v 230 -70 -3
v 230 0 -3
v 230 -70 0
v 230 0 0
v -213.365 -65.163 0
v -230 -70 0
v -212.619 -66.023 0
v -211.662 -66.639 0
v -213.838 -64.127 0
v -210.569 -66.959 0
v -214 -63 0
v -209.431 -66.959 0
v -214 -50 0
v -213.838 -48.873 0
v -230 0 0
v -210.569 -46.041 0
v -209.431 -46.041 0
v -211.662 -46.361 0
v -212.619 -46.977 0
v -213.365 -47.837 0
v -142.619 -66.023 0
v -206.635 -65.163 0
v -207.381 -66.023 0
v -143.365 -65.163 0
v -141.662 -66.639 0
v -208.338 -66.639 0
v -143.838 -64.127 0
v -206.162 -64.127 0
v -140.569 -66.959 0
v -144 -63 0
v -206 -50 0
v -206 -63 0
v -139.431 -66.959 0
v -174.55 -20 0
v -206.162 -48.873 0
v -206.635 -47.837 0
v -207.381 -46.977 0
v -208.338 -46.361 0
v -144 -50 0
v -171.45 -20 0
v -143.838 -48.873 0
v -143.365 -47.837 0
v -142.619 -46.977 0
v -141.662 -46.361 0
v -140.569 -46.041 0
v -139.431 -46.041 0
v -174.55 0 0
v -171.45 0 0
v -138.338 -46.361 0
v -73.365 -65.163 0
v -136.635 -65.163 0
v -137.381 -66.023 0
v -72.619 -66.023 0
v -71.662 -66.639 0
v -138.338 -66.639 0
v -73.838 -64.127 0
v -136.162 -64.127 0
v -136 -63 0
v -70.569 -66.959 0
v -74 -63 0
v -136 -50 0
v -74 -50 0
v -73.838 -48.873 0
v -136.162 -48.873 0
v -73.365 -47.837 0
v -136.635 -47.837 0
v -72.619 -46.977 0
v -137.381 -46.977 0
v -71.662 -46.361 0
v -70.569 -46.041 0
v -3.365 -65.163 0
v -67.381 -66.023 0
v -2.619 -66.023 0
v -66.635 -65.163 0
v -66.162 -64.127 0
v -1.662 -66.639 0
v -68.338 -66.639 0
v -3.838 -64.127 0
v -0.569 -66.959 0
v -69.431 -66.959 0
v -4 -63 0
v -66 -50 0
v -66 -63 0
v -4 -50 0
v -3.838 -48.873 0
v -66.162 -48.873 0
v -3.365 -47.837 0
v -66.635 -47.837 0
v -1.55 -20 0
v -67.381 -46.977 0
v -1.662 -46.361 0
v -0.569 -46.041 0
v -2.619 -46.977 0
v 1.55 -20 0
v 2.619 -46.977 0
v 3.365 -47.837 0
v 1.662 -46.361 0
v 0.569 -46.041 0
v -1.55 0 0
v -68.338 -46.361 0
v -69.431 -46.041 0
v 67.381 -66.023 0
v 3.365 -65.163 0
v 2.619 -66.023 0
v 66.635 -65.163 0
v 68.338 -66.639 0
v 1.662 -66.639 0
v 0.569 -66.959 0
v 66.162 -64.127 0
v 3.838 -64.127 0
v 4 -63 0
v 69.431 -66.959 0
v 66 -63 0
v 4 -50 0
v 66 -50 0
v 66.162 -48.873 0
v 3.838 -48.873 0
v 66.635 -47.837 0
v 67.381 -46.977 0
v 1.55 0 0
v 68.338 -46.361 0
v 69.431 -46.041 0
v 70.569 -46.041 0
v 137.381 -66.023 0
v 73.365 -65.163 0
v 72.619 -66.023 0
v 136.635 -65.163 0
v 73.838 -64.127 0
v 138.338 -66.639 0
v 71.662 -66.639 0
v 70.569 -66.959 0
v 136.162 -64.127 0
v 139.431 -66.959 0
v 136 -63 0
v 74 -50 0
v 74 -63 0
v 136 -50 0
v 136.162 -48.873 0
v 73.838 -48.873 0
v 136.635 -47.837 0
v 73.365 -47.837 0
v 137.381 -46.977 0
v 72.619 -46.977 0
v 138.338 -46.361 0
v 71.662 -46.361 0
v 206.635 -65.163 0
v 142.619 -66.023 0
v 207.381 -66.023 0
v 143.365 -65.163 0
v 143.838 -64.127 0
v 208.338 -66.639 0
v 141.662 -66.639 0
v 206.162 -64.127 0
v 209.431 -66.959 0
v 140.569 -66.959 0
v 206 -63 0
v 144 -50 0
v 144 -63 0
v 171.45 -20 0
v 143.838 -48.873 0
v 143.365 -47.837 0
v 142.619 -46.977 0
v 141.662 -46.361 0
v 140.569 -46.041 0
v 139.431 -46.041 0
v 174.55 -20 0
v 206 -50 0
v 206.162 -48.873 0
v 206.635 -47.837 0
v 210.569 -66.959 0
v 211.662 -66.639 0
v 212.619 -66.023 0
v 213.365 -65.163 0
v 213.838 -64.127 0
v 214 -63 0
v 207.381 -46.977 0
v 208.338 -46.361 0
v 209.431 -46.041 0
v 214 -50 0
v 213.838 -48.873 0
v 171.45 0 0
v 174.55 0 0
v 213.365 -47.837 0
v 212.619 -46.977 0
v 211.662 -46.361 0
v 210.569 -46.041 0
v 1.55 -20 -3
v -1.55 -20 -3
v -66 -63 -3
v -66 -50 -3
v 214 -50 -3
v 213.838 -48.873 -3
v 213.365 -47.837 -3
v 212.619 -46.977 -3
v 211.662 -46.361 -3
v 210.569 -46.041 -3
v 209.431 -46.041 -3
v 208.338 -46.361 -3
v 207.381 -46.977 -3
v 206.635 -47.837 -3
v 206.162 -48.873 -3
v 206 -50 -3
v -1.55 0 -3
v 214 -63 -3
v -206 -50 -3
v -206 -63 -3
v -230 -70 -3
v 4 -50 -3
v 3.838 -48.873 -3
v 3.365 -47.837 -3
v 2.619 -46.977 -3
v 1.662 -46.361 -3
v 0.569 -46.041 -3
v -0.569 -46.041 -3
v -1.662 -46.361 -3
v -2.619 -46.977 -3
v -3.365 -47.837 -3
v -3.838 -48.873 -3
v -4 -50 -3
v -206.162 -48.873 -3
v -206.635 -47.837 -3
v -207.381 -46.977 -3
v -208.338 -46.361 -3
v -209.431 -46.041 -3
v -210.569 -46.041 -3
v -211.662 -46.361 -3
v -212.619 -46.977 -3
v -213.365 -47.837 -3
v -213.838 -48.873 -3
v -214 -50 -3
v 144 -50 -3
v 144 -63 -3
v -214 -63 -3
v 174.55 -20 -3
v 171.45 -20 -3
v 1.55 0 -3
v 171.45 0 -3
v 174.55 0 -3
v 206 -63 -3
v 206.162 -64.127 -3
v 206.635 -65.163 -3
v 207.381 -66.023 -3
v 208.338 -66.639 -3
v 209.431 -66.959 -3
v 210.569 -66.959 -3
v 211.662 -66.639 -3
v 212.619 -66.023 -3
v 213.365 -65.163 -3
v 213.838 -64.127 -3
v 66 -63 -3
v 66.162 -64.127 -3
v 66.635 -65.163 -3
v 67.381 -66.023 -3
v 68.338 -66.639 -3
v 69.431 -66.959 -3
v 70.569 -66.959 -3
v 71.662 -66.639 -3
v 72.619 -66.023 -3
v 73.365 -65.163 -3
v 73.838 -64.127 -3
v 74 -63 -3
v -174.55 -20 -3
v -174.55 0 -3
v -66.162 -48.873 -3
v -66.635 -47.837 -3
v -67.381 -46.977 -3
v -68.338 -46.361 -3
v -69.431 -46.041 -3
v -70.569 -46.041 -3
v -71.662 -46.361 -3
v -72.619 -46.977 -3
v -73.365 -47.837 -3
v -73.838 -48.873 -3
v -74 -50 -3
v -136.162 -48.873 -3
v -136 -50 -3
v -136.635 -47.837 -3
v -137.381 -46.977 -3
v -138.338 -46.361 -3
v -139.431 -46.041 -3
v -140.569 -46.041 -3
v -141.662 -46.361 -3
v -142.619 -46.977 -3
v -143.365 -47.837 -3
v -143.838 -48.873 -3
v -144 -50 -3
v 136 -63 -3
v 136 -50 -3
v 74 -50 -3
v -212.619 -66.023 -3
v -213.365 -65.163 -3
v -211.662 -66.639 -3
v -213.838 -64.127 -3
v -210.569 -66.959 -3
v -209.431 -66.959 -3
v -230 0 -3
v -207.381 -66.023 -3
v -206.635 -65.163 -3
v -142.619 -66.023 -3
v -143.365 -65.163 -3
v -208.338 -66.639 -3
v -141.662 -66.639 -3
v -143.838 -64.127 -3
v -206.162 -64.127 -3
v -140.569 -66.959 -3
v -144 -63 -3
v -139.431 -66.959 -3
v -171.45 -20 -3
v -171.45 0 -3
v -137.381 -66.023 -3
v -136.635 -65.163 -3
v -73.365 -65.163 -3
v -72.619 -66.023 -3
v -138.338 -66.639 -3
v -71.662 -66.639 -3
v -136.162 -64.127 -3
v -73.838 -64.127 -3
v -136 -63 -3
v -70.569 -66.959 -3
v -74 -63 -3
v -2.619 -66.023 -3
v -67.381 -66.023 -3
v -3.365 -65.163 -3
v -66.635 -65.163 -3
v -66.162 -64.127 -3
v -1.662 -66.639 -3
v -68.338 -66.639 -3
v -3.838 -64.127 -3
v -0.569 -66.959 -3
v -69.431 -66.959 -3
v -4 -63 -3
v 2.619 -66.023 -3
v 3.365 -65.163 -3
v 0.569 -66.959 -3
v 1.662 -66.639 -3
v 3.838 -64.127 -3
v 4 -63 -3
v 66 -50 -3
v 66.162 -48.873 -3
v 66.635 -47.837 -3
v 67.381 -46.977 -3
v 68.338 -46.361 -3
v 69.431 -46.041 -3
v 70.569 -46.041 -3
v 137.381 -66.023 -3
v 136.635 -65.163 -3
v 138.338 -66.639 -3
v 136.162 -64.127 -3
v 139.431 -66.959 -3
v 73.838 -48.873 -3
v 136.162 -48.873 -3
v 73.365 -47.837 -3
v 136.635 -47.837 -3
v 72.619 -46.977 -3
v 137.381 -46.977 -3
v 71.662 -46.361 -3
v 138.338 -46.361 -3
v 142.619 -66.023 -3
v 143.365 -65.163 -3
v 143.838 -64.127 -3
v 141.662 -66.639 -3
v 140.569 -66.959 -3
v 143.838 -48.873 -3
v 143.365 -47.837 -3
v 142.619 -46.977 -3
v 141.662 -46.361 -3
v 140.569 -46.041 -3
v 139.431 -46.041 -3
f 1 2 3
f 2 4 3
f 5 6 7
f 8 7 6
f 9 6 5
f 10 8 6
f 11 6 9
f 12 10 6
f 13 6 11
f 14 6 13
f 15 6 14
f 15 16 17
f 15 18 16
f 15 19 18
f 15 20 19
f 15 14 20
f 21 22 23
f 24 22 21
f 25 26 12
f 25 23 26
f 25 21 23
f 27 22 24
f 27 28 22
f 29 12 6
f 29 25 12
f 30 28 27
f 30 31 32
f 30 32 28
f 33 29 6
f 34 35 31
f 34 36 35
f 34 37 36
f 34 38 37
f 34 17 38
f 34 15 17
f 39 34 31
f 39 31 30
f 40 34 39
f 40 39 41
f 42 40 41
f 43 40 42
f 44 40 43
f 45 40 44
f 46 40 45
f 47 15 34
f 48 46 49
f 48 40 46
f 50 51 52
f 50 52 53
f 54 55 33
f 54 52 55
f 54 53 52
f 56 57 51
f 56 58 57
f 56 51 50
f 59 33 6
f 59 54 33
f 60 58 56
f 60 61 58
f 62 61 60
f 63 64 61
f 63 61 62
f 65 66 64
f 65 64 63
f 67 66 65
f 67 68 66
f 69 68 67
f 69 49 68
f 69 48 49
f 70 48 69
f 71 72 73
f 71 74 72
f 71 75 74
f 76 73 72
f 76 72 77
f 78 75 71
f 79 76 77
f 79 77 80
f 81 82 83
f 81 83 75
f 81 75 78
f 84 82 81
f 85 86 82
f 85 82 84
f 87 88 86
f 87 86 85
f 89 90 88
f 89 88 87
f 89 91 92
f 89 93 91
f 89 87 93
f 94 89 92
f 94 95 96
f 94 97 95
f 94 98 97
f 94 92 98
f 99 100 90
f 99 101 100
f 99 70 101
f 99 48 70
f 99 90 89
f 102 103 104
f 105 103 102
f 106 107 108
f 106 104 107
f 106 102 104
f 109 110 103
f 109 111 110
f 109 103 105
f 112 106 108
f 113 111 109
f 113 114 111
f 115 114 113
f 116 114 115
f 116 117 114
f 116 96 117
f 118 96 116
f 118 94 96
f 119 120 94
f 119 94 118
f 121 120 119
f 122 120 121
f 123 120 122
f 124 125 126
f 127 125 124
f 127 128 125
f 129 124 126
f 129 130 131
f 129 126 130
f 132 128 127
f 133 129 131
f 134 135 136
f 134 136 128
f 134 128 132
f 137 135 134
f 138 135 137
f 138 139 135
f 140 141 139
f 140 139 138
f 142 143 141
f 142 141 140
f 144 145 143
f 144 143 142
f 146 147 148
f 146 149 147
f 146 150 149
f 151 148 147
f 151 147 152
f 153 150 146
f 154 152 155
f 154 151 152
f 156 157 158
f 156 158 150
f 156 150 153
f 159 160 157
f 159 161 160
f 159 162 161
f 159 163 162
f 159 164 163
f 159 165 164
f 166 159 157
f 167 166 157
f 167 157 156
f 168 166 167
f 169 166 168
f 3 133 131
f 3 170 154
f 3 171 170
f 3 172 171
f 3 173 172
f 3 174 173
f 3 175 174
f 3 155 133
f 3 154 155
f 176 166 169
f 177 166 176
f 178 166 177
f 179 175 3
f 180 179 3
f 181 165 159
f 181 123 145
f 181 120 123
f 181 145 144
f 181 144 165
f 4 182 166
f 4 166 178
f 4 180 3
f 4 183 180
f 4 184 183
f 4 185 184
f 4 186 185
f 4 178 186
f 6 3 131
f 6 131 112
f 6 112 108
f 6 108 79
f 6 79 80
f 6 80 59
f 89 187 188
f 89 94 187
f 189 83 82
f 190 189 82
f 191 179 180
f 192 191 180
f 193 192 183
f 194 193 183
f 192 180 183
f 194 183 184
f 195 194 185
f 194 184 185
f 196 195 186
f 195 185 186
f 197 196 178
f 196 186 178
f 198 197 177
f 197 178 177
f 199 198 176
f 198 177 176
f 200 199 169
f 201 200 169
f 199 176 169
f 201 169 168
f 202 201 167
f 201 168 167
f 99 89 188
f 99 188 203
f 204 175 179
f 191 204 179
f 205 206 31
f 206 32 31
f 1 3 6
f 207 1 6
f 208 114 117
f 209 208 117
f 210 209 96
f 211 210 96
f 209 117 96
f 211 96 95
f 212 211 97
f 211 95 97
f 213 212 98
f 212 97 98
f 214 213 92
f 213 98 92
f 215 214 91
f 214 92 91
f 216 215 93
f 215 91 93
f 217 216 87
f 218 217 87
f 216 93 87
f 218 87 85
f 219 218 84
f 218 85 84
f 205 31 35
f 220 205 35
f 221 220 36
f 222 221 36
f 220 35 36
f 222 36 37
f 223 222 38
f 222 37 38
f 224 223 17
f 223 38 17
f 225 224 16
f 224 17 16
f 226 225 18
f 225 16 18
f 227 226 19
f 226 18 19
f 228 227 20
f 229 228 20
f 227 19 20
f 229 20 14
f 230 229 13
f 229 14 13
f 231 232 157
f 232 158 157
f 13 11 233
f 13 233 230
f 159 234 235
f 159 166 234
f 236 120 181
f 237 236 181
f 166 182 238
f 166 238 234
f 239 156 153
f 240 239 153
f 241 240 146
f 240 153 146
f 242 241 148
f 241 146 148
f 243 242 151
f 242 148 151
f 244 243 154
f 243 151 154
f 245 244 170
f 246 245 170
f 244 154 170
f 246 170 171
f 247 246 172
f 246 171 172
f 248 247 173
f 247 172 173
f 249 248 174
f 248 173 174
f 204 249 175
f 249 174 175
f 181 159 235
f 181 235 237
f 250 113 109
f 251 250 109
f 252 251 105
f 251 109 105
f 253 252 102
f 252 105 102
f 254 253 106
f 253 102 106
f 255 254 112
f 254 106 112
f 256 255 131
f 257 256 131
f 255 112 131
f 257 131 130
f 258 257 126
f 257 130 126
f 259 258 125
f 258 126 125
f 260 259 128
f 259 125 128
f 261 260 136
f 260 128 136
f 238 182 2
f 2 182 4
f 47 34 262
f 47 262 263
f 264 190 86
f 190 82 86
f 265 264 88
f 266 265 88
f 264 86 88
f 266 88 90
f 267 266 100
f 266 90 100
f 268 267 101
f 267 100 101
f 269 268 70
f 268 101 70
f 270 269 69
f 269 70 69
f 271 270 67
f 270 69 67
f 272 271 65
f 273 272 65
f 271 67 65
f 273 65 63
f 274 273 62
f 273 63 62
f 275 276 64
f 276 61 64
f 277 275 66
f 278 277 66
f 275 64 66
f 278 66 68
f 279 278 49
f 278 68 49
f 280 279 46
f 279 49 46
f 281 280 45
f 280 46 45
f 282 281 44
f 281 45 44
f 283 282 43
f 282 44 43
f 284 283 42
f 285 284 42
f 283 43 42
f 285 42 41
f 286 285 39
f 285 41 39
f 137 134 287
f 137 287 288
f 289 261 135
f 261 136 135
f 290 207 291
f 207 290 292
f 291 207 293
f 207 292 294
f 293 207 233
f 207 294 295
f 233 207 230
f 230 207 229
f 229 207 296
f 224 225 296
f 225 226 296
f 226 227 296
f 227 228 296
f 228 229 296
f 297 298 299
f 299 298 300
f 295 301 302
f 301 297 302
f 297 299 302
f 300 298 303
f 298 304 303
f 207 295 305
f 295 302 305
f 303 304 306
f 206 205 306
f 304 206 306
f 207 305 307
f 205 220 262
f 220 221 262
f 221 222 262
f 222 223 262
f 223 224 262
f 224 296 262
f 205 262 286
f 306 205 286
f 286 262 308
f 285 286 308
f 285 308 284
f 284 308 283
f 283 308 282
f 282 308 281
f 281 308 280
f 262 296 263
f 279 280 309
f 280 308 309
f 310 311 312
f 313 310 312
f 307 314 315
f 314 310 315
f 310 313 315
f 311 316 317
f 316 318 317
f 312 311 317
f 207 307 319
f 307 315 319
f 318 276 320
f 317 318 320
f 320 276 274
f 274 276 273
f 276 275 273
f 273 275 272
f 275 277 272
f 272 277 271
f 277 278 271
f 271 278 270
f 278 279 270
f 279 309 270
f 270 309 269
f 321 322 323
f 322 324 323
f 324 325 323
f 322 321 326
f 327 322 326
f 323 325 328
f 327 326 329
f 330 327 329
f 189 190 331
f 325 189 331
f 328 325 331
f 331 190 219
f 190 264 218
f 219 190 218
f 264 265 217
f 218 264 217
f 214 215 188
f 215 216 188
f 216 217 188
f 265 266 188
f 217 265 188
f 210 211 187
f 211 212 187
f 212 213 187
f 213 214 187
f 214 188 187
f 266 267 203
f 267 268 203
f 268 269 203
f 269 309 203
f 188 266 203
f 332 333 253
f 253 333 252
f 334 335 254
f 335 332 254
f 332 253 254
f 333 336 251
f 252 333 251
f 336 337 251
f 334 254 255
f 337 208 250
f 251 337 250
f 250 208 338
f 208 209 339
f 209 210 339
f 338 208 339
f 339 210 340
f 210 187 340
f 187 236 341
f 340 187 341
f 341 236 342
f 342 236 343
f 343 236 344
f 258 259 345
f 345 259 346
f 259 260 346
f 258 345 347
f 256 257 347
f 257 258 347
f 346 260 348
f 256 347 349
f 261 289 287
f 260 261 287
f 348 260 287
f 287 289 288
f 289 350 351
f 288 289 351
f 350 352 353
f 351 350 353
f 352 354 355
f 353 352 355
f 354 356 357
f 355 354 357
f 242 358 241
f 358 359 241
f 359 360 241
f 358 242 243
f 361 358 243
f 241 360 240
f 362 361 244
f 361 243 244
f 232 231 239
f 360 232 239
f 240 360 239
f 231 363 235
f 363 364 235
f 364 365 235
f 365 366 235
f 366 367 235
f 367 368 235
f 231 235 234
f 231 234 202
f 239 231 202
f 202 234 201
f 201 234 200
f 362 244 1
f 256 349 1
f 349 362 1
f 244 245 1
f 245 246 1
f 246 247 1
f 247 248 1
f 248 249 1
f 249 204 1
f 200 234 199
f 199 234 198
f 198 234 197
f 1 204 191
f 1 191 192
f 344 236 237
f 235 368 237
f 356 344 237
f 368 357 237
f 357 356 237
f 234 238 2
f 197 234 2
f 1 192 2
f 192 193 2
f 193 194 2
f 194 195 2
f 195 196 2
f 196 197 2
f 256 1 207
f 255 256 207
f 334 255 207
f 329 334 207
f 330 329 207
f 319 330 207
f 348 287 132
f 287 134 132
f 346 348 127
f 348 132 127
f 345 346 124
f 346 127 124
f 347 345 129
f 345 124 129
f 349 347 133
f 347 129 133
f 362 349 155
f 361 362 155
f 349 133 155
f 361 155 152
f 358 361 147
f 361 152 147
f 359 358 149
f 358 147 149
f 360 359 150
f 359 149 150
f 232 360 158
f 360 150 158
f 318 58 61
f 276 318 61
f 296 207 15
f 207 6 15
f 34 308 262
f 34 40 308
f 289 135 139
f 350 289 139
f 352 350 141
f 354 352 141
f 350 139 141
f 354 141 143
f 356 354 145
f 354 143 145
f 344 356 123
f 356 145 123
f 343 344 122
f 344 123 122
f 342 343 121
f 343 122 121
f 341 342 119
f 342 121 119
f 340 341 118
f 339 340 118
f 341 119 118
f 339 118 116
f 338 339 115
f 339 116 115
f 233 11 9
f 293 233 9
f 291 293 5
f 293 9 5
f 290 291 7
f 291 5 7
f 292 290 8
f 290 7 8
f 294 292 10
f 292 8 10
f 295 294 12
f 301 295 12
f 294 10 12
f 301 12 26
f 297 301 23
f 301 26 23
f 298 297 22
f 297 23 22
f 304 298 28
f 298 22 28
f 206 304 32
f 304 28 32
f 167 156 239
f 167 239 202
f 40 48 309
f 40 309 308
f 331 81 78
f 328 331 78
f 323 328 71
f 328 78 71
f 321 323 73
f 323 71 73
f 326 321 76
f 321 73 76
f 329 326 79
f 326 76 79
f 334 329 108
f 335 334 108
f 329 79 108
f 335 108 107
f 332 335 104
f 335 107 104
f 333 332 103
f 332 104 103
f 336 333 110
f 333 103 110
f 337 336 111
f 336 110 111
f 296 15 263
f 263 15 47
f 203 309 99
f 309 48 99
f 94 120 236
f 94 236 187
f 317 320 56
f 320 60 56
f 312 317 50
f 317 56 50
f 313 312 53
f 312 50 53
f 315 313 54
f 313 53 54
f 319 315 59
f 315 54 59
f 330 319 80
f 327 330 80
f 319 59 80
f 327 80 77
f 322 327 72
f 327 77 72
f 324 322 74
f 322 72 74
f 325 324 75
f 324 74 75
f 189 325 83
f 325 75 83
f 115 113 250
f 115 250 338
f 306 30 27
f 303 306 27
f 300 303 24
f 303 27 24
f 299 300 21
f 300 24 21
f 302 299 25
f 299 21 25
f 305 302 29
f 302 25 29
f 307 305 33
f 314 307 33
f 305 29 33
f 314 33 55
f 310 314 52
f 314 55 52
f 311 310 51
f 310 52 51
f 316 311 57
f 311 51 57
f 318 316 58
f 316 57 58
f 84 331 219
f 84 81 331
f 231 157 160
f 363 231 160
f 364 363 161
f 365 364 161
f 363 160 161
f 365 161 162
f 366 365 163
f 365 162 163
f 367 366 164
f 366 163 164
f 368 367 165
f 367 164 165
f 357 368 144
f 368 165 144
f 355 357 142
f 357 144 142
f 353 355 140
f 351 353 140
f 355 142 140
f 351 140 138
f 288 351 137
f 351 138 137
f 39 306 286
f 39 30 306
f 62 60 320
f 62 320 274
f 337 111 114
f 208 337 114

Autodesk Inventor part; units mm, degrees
ref_plane "YZ Plane" through (0, 0, 0) normal (1, 0, 0) x (0, 1, 0)
ref_plane "XZ Plane" through (0, 0, 0) normal (0, 1, 0) x (-1, 0, 0)
ref_plane "XY Plane" through (0, 0, 0) normal (0, 0, 1) x (1, 0, 0)
sketch "Sketch1" plane through (0, 0, 0) normal (0, 0, 1) x (1, 0, 0)
  line L0 (-230, 0) -> (230, 0)
  line L1 (230, 0) -> (230, -70)
  line L2 (230, -70) -> (-230, -70)
  line L3 (-230, -70) -> (-230, 0)
  point P0 (0, 0)
  point P1 (0, 0)
  dimension "d0" = 460
  dimension "d1" = 70
extrude "Plate1" add sketch "Sketch1" against normal blind 3
sketch "Sketch2" plane through (0, 0, 0) normal (0, 0, 1) x (1, 0, 0)
  line L0 (-230, -70) -> (230, -70) projected
  line L1 (230, -70) -> (230, 0) projected
  line L2 (230, 0) -> (-230, 0) projected
  line L3 (-230, 0) -> (-230, -70) projected
  circle A0 centre (0, -63) radius 4
  circle A1 centre (0, -50) radius 4
  line L4 (4, -63) -> (4, -50)
  line L5 (-4, -63) -> (-4, -50)
  point P0 (0, 0)
  point P1 (0, -70)
  dimension "d3" = 8
  dimension "d5" = 7
  dimension "d22" = 13
extrude "Cut1" cut sketch "Sketch2" against normal through all contours A0 | A0 L5 A1 L4 | A1
pattern_linear "Rectangular Pattern1" count 7 spacing 70 along (-1, 0, 0) of "Cut1" first direction both ways yes
sketch "Sketch3" plane through (0, 0, 0) normal (0, 0, 1) x (1, 0, 0)
  line L0 (1.55, -20) -> (-1.55, -20)
  line L1 (-1.55, -20) -> (-1.55, 0)
  line L2 (-1.55, 0) -> (1.55, 0)
  line L3 (1.55, 0) -> (1.55, -20)
  line L4 (230, 0) -> (-230, 0) projected
  point P0 (0, 0)
  point P1 (0, 0)
  point P2 (0, 0)
  dimension "d11" = 3.1
  dimension "d12" = 20
extrude "Cut2" cut sketch "Sketch3" against normal blind 3
pattern_linear "Rectangular Pattern2" count 3 spacing 173 along (-1, 0, 0) of "Cut2" first direction both ways yes
equation "\"d6\" = Thickness"
equation "\"d13\" = Thickness"
equation "\"d2\" = Thickness"
equation "\"BendReliefWidth\" = Thickness"
equation "\"BendReliefDepth\" = 0.5 * Thickness"
equation "\"CornerReliefSize\" = 4 * Thickness"
equation "\"MinimumRemnant\" = 2 * Thickness"
equation "\"TransitionRadius\" = BendRadius"
equation "\"JacobiRadiusSize\" = BendRadius"
equation "\"GapSize\" = Thickness"
equation "\"Thickness\" = 3"
equation "\"BendRadius\" = 5"
properties part number "TRM 032 plate" material "Stainless Steel"
